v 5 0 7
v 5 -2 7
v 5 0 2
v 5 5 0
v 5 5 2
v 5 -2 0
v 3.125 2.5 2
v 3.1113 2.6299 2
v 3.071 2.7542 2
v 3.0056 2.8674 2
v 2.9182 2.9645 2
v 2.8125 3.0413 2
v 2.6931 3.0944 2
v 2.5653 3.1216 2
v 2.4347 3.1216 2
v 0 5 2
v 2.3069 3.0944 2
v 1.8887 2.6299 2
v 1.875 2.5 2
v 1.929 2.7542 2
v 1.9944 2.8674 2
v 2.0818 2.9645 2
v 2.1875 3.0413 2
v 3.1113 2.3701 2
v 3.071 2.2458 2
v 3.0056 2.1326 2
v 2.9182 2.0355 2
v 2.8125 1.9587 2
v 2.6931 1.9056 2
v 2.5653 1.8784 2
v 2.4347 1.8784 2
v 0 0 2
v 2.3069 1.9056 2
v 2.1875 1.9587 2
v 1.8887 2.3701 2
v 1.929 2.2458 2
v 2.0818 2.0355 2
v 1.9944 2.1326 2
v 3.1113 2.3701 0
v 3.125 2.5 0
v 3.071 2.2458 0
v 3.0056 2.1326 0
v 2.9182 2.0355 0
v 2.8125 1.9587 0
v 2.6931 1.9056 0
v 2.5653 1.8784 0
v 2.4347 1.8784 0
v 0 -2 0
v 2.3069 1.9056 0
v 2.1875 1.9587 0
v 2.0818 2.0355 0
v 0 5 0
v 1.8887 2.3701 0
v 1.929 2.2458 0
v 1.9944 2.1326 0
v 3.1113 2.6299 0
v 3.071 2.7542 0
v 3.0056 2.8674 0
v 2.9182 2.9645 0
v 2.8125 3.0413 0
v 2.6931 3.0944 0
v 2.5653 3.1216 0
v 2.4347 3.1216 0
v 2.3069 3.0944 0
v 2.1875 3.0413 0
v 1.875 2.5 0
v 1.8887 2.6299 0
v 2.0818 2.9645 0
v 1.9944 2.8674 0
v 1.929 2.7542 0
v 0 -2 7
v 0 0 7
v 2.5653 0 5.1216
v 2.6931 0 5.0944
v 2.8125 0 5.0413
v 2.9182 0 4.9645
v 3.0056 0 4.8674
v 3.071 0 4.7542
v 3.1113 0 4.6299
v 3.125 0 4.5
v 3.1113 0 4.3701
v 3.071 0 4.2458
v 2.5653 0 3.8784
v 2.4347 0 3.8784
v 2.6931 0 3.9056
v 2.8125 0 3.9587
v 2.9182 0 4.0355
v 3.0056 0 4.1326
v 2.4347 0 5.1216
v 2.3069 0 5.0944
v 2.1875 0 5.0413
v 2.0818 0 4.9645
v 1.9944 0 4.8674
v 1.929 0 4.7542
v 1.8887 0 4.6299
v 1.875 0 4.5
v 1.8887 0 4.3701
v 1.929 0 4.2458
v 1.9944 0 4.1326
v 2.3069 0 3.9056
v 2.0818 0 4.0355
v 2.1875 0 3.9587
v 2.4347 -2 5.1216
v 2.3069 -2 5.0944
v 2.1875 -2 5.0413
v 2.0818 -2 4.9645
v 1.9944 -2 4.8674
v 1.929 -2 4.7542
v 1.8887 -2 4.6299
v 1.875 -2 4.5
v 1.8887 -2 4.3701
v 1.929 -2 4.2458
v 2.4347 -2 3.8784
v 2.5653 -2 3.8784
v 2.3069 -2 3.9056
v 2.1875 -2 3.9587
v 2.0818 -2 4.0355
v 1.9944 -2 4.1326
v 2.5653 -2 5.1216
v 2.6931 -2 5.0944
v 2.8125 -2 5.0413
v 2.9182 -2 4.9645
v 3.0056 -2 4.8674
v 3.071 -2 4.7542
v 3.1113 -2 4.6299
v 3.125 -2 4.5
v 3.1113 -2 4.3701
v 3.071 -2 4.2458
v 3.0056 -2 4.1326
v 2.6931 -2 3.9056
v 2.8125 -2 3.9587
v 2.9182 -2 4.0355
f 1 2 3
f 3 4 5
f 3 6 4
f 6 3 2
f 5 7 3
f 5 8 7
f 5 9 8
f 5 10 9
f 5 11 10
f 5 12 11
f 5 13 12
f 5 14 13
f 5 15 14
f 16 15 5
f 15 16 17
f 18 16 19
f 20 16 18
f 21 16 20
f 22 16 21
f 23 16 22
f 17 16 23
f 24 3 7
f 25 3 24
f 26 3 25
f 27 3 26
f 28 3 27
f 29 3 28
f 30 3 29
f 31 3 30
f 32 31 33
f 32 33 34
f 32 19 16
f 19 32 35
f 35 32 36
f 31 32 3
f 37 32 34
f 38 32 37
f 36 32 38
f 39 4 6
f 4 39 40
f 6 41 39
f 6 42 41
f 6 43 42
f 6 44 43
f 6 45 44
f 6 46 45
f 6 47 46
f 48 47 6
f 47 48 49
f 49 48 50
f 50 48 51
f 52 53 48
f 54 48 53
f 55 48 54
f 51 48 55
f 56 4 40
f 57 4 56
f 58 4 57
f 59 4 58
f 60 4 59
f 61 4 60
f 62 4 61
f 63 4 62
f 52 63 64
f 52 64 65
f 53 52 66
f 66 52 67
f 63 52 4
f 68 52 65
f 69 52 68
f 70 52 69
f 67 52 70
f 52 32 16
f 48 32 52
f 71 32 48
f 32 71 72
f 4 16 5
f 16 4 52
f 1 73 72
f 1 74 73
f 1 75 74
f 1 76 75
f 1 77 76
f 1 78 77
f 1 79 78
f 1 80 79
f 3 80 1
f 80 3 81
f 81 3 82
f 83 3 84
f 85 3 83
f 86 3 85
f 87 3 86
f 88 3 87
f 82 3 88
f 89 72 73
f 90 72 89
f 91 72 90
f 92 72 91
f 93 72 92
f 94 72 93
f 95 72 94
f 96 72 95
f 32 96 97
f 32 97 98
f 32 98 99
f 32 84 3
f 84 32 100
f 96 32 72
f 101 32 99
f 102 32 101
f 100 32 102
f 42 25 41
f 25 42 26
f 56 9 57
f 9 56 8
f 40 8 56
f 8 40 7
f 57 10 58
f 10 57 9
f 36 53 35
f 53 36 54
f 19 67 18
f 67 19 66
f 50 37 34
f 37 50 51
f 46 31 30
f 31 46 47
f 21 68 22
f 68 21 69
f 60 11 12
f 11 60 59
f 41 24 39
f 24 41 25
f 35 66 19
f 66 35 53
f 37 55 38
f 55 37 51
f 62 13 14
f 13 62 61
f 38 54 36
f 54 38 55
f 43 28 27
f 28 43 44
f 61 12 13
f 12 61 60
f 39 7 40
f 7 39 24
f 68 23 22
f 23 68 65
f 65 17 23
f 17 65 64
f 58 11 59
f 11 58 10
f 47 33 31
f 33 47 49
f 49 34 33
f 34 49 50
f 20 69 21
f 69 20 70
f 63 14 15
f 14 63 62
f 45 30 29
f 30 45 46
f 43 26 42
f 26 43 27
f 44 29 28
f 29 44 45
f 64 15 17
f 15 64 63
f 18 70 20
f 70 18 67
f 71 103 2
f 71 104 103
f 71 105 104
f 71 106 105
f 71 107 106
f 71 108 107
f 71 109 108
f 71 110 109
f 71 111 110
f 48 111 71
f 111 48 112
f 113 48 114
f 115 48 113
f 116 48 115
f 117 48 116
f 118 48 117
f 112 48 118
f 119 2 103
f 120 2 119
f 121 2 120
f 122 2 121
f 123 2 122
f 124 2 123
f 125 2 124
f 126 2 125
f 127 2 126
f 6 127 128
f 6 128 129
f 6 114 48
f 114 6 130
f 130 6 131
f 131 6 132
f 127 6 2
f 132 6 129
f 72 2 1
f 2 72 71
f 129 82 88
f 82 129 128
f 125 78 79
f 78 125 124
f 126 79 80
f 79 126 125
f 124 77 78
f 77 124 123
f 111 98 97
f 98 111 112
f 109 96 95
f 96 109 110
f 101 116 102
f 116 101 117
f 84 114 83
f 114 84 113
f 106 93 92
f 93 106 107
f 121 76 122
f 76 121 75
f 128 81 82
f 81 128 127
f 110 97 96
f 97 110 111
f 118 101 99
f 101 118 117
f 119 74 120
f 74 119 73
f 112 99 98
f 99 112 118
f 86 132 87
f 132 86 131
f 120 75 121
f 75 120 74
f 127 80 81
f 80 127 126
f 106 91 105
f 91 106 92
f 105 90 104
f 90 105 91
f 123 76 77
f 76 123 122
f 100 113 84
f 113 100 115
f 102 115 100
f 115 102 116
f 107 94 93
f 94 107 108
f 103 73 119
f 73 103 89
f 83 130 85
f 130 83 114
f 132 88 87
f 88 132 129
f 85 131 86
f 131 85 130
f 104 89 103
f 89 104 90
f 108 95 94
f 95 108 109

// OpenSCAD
$fn = 30;


module plate(w) 
{
	
	difference()
	{
		cube( [ w[0], w[1], w[2] ] );
		translate([
			w[0]/2,
			w[1]/2,
			0 ]) 
		scale([  w[0], w[1], w[2] ] )cylinder( r=1/8,  h=1);
	}
}

module bracket(size)
{
	plate( size );
	translate([ 0,0,size[2] ]) rotate(90, [1,0,0]) plate( size );
	translate([ 0,-size[2],0 ]) cube( [ size[0], size[2], size[2] ] );
}


bracket([5, 5, 2]);
